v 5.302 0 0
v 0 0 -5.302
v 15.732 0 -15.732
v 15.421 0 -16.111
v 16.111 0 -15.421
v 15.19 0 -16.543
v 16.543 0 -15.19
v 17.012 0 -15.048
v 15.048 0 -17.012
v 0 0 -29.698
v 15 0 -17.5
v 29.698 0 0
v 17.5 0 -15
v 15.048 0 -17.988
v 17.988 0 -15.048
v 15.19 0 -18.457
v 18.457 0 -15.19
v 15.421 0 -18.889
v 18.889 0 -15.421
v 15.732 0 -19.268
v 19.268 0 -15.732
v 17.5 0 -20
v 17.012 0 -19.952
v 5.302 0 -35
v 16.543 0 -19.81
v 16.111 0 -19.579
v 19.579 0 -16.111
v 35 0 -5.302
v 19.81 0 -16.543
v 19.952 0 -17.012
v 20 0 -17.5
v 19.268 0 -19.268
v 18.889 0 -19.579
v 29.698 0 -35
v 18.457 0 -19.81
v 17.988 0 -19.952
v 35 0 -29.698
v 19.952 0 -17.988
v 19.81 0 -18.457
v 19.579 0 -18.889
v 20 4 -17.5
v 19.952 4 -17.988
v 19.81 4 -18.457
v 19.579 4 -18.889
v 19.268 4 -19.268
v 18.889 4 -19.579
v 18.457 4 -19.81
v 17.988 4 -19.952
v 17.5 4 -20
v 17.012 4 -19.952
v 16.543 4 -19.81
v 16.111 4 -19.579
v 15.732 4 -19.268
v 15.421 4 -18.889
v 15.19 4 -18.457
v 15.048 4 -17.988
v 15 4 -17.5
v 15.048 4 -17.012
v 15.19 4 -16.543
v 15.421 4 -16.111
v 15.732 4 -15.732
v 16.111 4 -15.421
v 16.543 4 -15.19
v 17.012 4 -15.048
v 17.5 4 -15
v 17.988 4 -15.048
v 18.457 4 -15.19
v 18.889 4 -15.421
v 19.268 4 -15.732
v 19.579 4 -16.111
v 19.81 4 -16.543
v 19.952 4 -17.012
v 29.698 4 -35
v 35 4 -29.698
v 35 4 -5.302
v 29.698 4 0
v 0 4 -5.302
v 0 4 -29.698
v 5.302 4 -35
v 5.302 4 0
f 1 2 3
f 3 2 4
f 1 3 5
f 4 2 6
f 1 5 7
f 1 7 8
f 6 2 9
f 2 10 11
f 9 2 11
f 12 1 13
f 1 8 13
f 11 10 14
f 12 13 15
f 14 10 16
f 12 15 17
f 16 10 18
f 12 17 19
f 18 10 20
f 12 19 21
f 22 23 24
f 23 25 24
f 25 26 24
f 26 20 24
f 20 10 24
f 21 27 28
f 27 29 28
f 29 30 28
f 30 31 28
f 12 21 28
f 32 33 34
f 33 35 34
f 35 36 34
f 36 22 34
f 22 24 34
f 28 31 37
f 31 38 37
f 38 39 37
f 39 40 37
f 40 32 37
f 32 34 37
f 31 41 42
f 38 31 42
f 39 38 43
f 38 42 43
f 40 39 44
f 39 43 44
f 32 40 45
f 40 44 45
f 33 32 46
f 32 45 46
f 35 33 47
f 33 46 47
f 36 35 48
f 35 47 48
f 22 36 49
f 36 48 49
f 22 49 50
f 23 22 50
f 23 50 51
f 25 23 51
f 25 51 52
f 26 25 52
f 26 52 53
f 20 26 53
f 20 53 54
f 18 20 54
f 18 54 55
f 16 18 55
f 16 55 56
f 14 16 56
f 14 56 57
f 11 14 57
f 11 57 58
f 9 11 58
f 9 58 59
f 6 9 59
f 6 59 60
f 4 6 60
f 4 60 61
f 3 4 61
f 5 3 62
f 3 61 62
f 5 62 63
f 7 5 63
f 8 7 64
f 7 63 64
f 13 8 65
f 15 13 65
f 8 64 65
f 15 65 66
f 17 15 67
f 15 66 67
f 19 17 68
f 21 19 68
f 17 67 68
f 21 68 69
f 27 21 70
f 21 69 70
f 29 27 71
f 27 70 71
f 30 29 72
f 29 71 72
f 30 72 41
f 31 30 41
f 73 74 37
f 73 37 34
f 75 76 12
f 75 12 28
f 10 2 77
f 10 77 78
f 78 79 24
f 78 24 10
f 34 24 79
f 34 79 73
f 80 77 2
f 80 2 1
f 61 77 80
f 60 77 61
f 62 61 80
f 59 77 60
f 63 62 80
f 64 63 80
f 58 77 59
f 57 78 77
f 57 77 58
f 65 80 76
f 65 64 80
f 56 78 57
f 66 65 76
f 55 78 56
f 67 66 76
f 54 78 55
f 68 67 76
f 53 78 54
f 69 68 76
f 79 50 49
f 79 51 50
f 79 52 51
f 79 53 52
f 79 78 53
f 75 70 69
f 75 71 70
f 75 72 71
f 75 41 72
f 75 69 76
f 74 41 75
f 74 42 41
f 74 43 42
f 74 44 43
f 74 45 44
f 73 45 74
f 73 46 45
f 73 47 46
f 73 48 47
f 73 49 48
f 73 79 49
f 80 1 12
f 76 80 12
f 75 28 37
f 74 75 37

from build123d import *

# Parameters (mm, degrees)
CROQUIS1_W              = 35
CROQUIS1_H              = 35
SALIENTE_EXTRUIR1_DEPTH = 4
CROQUIS2_OUTSIDE_W      = 46.932
CROQUIS2_OUTSIDE_H      = 46.932
CORTAR_EXTRUIR2_DEPTH   = 18
CROQUIS3_R              = 2.5
CORTAR_EXTRUIR3_DEPTH   = 5


with BuildPart() as part:
    # Croquis1 → Saliente-Extruir1 (new body)
    with BuildSketch(Plane(origin=(0, 0, 0), x_dir=(1, 0, 0), z_dir=(0, 1, 0))):
        with Locations((17.5, 17.5)):
            Rectangle(CROQUIS1_W, CROQUIS1_H)
    extrude(amount=SALIENTE_EXTRUIR1_DEPTH)

    # Croquis2 outside → Cortar-Extruir2 (cut)
    with BuildSketch(Plane(origin=(0, 4, 0), x_dir=(1, 0, 0), z_dir=(0, 1, 0))):
        with Locations((17.5, 17.5)):
            Rectangle(CROQUIS2_OUTSIDE_W, CROQUIS2_OUTSIDE_H)
        Polygon((5.30151519, 35), (0, 29.69848481), (0, 5.30151519), (5.30151519, 0), (29.69848481, 0), (35, 5.30151519), (35, 29.69848481), (29.69848481, 35), align=None, mode=Mode.SUBTRACT)
    extrude(amount=-CORTAR_EXTRUIR2_DEPTH, mode=Mode.SUBTRACT)

    # Croquis3 → Cortar-Extruir3 (cut, through all)
    with BuildSketch(Plane(origin=(0, 4, 0), x_dir=(1, 0, 0), z_dir=(0, 1, 0))):
        with Locations((17.5, 17.5)):
            Circle(CROQUIS3_R)
    extrude(amount=-CORTAR_EXTRUIR3_DEPTH, mode=Mode.SUBTRACT)


solid = part.part
